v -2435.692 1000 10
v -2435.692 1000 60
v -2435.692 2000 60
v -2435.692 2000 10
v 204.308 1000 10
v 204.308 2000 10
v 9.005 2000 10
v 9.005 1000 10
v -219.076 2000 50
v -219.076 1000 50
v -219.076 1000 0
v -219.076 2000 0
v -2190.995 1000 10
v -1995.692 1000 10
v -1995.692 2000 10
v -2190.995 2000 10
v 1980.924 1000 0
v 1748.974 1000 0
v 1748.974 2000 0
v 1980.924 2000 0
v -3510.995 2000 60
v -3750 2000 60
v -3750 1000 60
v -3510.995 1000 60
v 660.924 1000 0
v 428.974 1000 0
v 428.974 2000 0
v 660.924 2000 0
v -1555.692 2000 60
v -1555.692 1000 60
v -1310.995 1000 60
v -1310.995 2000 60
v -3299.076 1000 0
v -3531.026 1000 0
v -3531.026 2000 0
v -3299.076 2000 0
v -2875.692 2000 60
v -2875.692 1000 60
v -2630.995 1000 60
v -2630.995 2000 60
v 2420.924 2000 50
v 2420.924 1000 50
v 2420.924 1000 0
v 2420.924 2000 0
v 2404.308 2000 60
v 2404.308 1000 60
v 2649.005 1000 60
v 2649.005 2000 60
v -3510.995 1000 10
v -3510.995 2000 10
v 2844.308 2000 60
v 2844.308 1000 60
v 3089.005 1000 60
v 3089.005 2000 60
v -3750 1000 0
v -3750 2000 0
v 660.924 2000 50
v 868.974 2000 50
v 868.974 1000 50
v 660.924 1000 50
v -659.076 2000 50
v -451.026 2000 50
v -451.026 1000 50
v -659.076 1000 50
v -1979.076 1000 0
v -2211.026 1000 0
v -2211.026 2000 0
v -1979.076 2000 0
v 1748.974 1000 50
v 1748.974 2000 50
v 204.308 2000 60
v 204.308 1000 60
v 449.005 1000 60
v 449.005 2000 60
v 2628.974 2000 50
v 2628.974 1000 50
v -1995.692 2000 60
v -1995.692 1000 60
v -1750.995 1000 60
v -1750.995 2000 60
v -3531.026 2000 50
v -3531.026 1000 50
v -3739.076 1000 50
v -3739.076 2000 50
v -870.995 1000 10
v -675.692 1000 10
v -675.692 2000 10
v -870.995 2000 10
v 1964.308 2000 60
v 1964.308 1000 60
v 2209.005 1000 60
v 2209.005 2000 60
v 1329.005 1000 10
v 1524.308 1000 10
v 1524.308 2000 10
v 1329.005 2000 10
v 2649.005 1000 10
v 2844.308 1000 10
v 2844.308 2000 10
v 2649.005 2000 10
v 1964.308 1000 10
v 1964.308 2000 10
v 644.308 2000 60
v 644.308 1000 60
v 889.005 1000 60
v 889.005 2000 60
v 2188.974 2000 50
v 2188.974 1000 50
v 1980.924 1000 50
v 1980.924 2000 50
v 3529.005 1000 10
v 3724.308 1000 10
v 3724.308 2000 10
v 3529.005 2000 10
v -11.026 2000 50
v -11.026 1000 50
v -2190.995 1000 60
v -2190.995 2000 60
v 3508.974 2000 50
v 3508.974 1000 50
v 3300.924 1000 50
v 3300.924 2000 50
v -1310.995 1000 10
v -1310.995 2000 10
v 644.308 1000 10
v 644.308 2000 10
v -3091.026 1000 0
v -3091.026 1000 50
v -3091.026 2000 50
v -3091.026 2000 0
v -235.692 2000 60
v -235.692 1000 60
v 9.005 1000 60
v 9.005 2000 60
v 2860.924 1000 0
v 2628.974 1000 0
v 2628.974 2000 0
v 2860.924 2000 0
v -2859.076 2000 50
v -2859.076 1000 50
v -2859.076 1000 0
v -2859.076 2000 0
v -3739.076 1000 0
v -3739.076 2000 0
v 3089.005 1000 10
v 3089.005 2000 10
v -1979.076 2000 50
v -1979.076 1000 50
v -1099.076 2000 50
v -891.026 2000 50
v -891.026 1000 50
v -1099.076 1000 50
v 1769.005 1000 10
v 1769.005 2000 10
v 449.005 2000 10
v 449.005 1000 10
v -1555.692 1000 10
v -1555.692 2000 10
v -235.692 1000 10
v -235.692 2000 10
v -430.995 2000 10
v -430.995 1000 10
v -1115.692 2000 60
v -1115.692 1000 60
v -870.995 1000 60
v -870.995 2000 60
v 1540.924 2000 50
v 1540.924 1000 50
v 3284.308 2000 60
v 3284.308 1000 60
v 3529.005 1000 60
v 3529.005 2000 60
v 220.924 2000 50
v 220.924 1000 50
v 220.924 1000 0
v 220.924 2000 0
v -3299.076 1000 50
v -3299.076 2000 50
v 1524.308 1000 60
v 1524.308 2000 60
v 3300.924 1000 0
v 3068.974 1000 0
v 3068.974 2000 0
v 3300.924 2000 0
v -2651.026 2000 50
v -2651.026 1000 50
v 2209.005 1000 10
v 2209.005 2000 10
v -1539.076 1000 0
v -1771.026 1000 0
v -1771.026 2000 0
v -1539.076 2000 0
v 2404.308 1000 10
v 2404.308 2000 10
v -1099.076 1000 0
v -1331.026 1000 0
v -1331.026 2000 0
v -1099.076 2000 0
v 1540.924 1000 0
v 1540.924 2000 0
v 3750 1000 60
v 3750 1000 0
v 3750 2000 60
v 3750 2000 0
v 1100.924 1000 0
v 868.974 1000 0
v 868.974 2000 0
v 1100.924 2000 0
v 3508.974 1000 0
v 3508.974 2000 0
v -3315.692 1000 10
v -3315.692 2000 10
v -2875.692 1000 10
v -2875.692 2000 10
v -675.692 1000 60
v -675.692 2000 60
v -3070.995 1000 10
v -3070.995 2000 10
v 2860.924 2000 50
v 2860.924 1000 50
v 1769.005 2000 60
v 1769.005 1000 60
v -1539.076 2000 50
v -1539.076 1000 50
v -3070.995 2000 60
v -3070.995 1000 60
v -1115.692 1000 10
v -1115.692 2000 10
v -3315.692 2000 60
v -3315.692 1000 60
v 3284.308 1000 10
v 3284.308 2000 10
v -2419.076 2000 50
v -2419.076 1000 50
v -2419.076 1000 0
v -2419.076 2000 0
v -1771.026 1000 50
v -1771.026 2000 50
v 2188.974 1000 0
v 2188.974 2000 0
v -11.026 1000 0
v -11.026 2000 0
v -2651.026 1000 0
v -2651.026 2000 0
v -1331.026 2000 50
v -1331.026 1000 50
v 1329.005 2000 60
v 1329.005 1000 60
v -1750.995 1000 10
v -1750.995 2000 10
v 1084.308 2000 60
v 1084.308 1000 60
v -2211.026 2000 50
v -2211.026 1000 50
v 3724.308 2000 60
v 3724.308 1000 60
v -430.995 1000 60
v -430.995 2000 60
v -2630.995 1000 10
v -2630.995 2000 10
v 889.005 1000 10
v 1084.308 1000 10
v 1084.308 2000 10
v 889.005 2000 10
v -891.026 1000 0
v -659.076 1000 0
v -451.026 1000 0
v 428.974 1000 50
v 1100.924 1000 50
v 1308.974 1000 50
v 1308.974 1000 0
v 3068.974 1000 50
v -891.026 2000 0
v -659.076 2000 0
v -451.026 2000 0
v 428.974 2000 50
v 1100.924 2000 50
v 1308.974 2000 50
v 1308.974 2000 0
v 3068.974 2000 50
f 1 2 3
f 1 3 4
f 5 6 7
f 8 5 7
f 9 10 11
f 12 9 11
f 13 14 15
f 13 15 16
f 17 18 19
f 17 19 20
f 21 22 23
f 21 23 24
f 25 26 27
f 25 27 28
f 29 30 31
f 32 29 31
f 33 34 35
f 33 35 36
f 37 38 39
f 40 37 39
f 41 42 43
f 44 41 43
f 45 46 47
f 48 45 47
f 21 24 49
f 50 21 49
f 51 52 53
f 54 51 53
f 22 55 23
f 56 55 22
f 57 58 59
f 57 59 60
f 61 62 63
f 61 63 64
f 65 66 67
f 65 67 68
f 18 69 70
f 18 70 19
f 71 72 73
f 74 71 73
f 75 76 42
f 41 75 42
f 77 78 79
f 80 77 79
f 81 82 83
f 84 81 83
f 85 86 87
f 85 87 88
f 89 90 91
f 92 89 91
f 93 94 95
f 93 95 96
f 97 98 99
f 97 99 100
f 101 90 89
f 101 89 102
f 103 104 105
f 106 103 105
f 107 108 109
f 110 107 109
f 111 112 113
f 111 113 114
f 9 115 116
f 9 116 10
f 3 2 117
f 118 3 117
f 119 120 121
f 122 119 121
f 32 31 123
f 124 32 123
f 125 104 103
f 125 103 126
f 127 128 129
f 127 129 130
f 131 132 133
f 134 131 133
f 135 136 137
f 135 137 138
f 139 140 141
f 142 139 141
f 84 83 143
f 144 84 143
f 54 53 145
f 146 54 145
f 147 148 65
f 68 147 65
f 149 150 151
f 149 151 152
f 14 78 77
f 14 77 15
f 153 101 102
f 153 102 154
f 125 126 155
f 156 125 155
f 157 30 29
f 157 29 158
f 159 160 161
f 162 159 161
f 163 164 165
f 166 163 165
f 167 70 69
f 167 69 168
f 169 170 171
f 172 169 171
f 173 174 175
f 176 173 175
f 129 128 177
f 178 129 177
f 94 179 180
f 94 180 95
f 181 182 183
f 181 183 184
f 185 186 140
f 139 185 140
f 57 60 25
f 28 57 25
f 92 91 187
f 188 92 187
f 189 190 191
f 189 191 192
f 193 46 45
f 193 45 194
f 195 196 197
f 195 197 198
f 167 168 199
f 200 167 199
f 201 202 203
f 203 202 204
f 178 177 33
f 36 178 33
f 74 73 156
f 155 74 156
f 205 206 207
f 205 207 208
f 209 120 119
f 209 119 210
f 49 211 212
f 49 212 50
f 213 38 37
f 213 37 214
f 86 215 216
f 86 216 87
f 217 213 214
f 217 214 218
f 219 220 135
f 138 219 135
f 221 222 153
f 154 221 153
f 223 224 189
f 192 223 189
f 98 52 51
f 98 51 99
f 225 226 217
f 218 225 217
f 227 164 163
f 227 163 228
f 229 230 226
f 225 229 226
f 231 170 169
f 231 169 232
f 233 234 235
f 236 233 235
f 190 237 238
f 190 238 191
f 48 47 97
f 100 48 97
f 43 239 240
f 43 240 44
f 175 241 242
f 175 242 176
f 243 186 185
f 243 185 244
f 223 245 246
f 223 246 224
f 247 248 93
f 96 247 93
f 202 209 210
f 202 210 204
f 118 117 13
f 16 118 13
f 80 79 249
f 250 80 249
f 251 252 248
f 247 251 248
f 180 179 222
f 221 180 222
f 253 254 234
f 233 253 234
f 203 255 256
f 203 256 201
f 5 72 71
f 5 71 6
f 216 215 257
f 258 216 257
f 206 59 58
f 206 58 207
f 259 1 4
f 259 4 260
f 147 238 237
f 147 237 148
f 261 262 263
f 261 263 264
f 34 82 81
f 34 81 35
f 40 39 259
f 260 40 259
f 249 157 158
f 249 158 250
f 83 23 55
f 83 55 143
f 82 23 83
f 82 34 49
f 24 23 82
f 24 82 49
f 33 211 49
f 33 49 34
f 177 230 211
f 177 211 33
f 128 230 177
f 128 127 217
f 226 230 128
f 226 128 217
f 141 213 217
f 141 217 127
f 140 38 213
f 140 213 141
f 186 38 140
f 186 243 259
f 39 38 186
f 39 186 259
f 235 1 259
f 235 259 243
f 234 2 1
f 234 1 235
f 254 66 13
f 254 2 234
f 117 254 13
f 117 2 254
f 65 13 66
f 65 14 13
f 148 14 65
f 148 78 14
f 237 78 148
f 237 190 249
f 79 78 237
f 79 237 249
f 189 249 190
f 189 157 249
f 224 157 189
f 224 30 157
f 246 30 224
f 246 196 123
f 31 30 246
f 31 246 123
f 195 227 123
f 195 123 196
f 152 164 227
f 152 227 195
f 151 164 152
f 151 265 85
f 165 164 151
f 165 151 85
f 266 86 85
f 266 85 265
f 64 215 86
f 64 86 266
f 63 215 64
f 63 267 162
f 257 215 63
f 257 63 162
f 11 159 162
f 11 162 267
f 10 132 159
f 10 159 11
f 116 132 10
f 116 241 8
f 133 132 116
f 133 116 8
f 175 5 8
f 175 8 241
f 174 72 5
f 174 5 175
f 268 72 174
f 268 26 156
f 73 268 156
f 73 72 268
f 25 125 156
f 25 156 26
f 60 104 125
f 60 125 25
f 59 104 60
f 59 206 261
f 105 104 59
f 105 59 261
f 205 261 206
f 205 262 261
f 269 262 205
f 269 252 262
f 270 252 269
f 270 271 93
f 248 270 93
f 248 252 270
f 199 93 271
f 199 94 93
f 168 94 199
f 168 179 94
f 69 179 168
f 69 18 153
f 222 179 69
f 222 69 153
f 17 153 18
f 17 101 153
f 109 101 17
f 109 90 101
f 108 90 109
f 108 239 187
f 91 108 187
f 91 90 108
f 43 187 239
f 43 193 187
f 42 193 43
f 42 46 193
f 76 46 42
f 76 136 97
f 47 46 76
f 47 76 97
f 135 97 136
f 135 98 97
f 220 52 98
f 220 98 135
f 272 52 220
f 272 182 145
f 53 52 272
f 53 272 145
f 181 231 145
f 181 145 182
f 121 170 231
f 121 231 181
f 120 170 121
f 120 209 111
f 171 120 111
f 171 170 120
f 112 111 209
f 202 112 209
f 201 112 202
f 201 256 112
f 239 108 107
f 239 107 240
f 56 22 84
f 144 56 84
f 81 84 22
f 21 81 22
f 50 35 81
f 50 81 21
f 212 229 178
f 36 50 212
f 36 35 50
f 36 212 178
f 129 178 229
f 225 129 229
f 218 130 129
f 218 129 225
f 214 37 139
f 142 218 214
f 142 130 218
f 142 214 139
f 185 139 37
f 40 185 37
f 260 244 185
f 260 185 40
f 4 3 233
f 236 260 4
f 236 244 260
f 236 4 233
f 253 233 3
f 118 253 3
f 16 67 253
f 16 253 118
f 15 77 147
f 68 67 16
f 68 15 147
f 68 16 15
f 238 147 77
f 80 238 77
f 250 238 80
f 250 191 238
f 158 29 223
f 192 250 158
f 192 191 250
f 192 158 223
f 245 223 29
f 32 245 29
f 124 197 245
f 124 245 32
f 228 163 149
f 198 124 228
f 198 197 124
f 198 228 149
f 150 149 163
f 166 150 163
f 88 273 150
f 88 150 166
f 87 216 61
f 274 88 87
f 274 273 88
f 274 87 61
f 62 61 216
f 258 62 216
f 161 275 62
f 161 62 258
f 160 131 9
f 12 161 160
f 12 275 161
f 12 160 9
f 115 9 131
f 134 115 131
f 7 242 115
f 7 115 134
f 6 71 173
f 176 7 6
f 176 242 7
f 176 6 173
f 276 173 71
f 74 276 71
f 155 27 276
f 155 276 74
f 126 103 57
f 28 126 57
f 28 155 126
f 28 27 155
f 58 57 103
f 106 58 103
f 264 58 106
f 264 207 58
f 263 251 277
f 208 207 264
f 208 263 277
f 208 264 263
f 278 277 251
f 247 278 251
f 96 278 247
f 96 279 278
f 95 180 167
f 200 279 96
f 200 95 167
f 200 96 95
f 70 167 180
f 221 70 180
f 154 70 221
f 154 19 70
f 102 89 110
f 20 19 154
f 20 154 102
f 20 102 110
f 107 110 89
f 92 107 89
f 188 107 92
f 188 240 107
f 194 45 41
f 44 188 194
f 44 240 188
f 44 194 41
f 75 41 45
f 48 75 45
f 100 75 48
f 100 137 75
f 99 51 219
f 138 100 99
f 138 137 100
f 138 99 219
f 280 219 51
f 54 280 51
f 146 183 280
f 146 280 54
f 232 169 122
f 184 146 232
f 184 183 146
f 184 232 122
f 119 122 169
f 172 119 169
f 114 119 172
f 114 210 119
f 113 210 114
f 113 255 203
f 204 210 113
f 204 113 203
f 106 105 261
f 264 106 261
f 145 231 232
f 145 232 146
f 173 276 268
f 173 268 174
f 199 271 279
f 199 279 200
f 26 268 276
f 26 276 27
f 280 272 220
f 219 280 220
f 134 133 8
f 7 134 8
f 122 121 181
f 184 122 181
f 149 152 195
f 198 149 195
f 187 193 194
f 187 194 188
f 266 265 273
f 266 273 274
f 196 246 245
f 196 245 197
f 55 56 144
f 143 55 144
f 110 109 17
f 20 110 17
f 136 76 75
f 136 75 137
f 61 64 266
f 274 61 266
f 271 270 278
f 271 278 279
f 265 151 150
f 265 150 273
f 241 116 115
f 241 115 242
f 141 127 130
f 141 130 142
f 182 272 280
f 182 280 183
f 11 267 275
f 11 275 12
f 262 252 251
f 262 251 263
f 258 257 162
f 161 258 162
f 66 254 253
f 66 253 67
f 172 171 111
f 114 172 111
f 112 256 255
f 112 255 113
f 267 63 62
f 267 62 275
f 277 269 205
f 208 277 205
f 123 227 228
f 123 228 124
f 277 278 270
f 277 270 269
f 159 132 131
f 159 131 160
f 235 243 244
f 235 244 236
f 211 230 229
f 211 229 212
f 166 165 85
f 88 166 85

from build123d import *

# Parameters (mm, degrees)
SKETCH1_W           = 7500
SKETCH1_H           = 4000
BOSS_EXTRUDE1_DEPTH = 60
SKETCH2_W           = 208.04993412
SKETCH2_H           = 50
SKETCH2_W_2         = 195.302892205
CUT_EXTRUDE1_DEPTH  = 5107
SKETCH3_W           = 8196.868920553
SKETCH3_H           = 2618.215118215
CUT_EXTRUDE2_DEPTH  = 1189.715985199
SKETCH4_W           = 8610.420371691
SKETCH4_H           = 2020.754263889
CUT_EXTRUDE3_DEPTH  = 1189.715985199


with BuildPart() as part:
    # Sketch1 → Boss-Extrude1 (new body)
    with BuildSketch(Plane.XY):
        Rectangle(SKETCH1_W, SKETCH1_H)
    extrude(amount=BOSS_EXTRUDE1_DEPTH)

    # Sketch2 → Cut-Extrude1 (cut)
    with BuildSketch(Plane(origin=(0, -2000, 0), x_dir=(-1, 0, 0), z_dir=(0, -1, 0))):
        with Locations((3635.051095731, -25)):
            Rectangle(SKETCH2_W, SKETCH2_H)
        with Locations((3413.343616701, -35)):
            Rectangle(SKETCH2_W_2, SKETCH2_H)
        with Locations((3195.051095731, -25)):
            Rectangle(SKETCH2_W, SKETCH2_H)
        with Locations((2973.343616701, -35)):
            Rectangle(SKETCH2_W_2, SKETCH2_H)
        with Locations((2755.051095731, -25)):
            Rectangle(SKETCH2_W, SKETCH2_H)
        with Locations((2533.343616701, -35)):
            Rectangle(SKETCH2_W_2, SKETCH2_H)
        with Locations((2315.051095731, -25)):
            Rectangle(SKETCH2_W, SKETCH2_H)
        with Locations((2093.343616701, -35)):
            Rectangle(SKETCH2_W_2, SKETCH2_H)
        with Locations((1875.051095731, -25)):
            Rectangle(SKETCH2_W, SKETCH2_H)
        with Locations((1653.343616701, -35)):
            Rectangle(SKETCH2_W_2, SKETCH2_H)
        with Locations((1435.051095731, -25)):
            Rectangle(SKETCH2_W, SKETCH2_H)
        with Locations((1213.343616701, -35)):
            Rectangle(SKETCH2_W_2, SKETCH2_H)
        with Locations((995.051095731, -25)):
            Rectangle(SKETCH2_W, SKETCH2_H)
        with Locations((773.343616701, -35)):
            Rectangle(SKETCH2_W_2, SKETCH2_H)
        with Locations((555.051095731, -25)):
            Rectangle(SKETCH2_W, SKETCH2_H)
        with Locations((333.343616701, -35)):
            Rectangle(SKETCH2_W_2, SKETCH2_H)
        with Locations((115.051095731, -25)):
            Rectangle(SKETCH2_W, SKETCH2_H)
        with Locations((-106.6563833, -35)):
            Rectangle(SKETCH2_W_2, SKETCH2_H)
        with Locations((-324.948904269, -25)):
            Rectangle(SKETCH2_W, SKETCH2_H)
        with Locations((-546.6563833, -35)):
            Rectangle(SKETCH2_W_2, SKETCH2_H)
        with Locations((-764.948904269, -25)):
            Rectangle(SKETCH2_W, SKETCH2_H)
        with Locations((-986.6563833, -35)):
            Rectangle(SKETCH2_W_2, SKETCH2_H)
        with Locations((-1204.948904269, -25)):
            Rectangle(SKETCH2_W, SKETCH2_H)
        with Locations((-1426.6563833, -35)):
            Rectangle(SKETCH2_W_2, SKETCH2_H)
        with Locations((-1644.948904269, -25)):
            Rectangle(SKETCH2_W, SKETCH2_H)
        with Locations((-1866.6563833, -35)):
            Rectangle(SKETCH2_W_2, SKETCH2_H)
        with Locations((-2084.948904269, -25)):
            Rectangle(SKETCH2_W, SKETCH2_H)
        with Locations((-2306.6563833, -35)):
            Rectangle(SKETCH2_W_2, SKETCH2_H)
        with Locations((-2524.948904269, -25)):
            Rectangle(SKETCH2_W, SKETCH2_H)
        with Locations((-2746.6563833, -35)):
            Rectangle(SKETCH2_W_2, SKETCH2_H)
        with Locations((-2964.948904269, -25)):
            Rectangle(SKETCH2_W, SKETCH2_H)
        with Locations((-3186.6563833, -35)):
            Rectangle(SKETCH2_W_2, SKETCH2_H)
        with Locations((-3404.948904269, -25)):
            Rectangle(SKETCH2_W, SKETCH2_H)
        with Locations((-3626.6563833, -35)):
            Rectangle(SKETCH2_W_2, SKETCH2_H)
    extrude(amount=-CUT_EXTRUDE1_DEPTH, mode=Mode.SUBTRACT)

    # Sketch3 → Cut-Extrude2 (cut)
    with BuildSketch(Plane.XY.offset(60)):
        with Locations((348.434460276, -1309.107559108)):
            Rectangle(SKETCH3_W, SKETCH3_H)
    extrude(amount=-CUT_EXTRUDE2_DEPTH, mode=Mode.SUBTRACT)

    # Sketch4 → Cut-Extrude3 (cut)
    with BuildSketch(Plane.XY.offset(60)):
        with Locations((555.210185846, -10.377131944)):
            Rectangle(SKETCH4_W, SKETCH4_H)
    extrude(amount=-CUT_EXTRUDE3_DEPTH, mode=Mode.SUBTRACT)


solid = part.part
